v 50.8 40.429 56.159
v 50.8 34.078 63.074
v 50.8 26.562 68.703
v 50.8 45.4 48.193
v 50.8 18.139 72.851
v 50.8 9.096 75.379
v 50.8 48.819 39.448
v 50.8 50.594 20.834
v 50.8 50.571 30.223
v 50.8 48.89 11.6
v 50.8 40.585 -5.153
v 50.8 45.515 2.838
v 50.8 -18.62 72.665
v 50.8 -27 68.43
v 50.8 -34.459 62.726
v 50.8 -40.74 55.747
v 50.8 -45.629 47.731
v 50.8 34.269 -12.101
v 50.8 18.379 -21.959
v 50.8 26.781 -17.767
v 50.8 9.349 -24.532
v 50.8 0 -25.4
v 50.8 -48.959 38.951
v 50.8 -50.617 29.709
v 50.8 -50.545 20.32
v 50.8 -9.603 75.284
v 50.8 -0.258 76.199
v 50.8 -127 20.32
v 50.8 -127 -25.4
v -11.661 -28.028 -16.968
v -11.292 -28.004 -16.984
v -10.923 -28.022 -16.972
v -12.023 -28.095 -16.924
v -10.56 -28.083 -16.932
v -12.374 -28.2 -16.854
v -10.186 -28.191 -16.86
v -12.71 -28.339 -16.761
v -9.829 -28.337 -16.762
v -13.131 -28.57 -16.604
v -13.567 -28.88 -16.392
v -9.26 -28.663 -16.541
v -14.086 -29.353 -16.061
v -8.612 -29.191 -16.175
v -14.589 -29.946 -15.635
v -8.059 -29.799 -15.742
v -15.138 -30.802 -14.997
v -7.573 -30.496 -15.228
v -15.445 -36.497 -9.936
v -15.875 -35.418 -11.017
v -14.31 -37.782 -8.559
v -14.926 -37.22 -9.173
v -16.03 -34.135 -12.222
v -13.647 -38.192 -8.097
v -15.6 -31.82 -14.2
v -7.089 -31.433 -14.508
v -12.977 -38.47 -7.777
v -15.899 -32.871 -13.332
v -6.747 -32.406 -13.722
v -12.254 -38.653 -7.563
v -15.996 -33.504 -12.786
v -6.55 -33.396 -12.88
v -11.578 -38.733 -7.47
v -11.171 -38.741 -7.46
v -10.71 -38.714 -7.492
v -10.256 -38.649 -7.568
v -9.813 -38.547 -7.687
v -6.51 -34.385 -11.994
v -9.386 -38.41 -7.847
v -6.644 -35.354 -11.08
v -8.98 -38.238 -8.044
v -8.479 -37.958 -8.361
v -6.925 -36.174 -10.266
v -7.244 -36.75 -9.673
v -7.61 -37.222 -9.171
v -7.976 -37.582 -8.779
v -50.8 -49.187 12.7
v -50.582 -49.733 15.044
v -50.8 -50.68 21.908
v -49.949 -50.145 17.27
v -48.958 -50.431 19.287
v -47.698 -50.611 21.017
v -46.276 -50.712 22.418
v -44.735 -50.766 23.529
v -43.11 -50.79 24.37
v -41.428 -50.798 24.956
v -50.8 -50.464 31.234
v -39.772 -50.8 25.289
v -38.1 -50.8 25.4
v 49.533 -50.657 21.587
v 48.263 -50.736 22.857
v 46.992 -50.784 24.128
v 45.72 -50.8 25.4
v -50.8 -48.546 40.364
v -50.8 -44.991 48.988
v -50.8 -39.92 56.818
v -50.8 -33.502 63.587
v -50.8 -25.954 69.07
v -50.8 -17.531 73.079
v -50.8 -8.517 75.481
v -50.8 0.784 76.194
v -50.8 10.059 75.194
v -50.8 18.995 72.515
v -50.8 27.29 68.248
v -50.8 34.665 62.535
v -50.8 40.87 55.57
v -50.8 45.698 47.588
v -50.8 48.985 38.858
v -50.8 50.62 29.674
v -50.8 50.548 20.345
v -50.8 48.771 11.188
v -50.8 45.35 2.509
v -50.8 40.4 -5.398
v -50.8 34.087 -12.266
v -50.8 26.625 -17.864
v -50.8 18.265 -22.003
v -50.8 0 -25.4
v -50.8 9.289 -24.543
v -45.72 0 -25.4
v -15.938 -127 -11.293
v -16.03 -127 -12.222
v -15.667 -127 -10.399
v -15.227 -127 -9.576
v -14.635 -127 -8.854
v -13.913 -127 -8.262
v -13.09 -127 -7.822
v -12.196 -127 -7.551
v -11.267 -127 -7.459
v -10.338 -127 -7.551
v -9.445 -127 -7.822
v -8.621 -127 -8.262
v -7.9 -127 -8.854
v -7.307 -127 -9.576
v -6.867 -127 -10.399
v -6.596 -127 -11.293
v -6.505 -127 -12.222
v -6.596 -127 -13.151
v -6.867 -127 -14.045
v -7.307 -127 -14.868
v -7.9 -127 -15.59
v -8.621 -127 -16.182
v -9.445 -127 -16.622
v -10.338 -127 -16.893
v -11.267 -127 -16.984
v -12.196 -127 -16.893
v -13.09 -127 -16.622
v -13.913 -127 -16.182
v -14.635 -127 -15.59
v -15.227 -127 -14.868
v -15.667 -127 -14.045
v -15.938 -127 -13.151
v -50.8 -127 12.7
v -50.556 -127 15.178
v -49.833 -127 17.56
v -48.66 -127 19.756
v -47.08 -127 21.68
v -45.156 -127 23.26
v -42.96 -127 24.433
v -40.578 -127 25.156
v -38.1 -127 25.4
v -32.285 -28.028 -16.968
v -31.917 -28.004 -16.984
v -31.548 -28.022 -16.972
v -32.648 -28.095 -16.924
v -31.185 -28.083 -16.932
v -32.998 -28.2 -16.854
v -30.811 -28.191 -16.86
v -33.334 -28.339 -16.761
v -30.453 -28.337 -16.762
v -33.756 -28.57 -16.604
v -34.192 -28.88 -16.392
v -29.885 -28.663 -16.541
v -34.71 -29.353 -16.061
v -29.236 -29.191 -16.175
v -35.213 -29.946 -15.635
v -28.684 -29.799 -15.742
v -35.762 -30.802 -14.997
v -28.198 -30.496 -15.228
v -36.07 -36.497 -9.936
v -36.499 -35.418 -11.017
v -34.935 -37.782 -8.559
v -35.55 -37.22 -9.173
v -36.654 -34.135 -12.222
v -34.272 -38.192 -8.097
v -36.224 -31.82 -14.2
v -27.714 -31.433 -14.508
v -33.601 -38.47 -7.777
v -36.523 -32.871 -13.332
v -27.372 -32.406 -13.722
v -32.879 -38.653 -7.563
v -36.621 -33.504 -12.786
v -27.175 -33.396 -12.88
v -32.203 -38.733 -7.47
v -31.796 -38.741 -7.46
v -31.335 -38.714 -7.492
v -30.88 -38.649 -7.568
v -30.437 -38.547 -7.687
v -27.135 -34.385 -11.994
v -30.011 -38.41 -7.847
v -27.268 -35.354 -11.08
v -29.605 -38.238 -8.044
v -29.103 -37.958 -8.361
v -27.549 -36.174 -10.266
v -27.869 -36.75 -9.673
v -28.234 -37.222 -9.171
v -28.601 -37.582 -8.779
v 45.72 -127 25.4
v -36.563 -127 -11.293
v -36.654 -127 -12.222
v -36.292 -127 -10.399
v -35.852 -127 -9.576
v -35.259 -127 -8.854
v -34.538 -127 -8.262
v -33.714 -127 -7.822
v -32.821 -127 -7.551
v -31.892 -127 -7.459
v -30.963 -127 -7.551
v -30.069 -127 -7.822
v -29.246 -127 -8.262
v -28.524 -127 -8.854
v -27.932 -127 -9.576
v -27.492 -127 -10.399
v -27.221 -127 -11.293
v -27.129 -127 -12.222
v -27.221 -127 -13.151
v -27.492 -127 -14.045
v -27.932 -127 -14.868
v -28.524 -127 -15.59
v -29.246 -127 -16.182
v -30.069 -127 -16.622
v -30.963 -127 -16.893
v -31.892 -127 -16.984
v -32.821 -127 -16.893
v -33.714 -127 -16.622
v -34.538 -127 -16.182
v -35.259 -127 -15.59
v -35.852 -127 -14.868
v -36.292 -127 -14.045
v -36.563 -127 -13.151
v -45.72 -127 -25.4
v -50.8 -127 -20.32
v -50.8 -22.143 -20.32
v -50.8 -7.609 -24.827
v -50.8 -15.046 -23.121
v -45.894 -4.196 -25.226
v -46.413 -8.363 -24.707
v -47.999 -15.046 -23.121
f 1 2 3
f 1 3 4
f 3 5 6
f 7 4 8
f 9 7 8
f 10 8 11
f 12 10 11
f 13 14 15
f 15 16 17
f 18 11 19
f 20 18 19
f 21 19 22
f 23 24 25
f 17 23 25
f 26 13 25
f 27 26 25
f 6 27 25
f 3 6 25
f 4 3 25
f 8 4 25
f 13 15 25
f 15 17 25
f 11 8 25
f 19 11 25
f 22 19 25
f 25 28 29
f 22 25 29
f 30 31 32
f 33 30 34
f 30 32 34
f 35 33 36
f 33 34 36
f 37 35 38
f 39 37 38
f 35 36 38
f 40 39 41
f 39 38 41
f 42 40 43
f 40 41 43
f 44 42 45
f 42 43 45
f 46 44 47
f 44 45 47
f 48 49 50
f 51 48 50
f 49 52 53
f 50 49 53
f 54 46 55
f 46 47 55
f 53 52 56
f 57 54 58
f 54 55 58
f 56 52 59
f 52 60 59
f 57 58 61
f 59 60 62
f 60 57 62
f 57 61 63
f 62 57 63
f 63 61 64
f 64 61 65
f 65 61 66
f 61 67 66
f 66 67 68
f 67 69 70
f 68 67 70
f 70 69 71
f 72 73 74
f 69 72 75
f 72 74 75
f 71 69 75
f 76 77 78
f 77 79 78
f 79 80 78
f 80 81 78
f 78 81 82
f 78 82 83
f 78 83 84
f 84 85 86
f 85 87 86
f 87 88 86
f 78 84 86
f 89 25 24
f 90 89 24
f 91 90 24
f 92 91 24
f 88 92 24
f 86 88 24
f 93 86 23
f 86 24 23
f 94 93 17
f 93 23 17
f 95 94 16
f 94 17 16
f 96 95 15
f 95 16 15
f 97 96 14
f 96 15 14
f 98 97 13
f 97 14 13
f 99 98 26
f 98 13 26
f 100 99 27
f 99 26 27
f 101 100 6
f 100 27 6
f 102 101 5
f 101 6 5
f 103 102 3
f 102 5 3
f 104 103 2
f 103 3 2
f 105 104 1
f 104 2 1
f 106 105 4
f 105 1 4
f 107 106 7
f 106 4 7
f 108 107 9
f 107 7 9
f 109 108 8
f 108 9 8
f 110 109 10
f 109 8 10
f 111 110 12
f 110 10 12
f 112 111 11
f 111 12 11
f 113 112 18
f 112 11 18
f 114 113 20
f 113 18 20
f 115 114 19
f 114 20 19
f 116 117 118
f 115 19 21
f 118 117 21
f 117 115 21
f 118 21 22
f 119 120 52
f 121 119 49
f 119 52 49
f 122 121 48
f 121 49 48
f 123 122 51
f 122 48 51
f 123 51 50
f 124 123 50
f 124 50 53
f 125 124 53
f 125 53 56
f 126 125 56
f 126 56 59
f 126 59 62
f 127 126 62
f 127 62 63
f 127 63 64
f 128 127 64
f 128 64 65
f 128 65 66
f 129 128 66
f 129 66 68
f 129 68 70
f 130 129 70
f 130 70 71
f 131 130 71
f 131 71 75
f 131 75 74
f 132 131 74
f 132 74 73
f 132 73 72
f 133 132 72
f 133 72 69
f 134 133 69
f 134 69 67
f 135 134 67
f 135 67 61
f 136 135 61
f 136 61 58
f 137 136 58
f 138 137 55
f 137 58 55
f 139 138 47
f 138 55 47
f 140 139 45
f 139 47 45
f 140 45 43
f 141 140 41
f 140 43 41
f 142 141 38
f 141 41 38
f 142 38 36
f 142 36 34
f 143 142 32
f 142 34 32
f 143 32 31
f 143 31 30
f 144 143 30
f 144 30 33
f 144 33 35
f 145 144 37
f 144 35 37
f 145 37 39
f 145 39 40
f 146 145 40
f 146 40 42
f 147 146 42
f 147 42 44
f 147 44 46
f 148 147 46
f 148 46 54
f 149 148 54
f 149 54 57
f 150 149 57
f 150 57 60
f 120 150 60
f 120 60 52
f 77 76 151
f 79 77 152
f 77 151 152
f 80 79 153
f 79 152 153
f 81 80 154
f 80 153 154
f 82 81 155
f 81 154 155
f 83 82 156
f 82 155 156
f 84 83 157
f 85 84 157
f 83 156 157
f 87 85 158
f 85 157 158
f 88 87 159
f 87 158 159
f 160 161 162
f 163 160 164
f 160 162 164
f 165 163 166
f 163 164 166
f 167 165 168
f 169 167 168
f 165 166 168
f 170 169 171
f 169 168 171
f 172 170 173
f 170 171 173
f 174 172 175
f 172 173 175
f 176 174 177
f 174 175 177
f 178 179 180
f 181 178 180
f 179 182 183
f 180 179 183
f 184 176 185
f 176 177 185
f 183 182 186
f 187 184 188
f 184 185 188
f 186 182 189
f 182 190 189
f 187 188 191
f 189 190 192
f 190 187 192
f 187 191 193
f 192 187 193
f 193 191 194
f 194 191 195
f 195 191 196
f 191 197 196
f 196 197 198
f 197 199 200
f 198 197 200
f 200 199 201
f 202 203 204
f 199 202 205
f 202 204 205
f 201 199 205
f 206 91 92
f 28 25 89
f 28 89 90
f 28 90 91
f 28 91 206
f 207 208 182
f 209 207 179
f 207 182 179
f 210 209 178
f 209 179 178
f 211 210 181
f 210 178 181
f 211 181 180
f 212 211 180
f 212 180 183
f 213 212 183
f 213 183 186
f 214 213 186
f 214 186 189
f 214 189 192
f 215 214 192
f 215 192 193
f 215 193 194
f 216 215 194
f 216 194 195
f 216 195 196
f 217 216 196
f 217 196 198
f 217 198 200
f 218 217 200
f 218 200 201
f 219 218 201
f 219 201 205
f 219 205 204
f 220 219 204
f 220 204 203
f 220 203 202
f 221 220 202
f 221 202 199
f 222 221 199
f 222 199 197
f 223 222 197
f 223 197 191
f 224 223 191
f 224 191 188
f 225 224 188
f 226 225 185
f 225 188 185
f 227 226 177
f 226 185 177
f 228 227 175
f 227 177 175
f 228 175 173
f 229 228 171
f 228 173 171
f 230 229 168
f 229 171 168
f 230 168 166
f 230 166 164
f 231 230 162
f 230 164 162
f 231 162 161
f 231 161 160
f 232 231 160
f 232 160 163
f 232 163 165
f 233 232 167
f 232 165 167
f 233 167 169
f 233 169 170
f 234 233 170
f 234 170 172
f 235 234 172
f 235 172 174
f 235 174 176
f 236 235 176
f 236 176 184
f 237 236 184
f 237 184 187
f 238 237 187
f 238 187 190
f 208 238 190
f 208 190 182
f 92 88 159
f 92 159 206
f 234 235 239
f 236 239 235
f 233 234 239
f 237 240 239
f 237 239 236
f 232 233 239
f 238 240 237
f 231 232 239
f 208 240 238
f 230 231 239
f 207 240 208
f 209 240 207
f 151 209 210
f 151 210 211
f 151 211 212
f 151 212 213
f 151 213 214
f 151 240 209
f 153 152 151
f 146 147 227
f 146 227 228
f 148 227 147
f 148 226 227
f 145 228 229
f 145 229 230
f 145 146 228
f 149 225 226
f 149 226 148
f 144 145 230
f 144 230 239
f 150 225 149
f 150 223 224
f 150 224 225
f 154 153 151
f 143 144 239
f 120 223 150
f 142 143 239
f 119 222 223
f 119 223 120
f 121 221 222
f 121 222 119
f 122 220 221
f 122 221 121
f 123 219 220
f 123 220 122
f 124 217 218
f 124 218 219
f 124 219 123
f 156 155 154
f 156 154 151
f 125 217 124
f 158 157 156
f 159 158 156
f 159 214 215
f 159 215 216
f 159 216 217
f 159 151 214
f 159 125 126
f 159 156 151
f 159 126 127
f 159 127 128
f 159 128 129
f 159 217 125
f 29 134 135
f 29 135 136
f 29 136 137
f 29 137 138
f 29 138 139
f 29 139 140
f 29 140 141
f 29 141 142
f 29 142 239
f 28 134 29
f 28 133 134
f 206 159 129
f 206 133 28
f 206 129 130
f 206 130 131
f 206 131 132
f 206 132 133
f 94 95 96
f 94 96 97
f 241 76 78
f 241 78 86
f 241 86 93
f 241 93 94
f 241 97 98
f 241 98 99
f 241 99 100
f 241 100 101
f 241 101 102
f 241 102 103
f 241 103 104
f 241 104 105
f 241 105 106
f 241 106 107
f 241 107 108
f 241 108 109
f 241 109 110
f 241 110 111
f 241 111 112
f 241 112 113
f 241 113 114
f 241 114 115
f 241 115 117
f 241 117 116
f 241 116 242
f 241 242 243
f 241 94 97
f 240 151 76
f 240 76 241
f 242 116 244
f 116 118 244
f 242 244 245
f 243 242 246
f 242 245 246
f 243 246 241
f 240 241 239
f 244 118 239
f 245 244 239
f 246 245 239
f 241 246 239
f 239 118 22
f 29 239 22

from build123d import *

# Parameters (mm, degrees)
F0_W     = 101.6
F0_H     = 50.8
F1_DEPTH = 127
F2_R     = 4.7625
F3_DEPTH = 158.242
F4_R     = 12.7
F5_SIZE  = 5.08


with BuildPart() as f1:
    # F0 (on Front) → F1 (new body)
    with BuildSketch(Plane.XZ):
        Rectangle(F0_W, F0_H)
    extrude(amount=F1_DEPTH)

    # F2 (on face) → F3 (cut)
    with BuildSketch(Plane(origin=(0, 0, 0), x_dir=(-1, 0, 0), z_dir=(0, 1, 0))):
        with Locations((31.891733, -12.221986)):
            Circle(F2_R)
        with Locations((11.267137, -12.221986)):
            Circle(F2_R)
    extrude(amount=-F3_DEPTH, mode=Mode.SUBTRACT)

    # F4
    f4_edges = [f1.edges().sort_by_distance(p)[0] for p in [
        (-50.8, -63.5, 25.4),
    ]]
    fillet(f4_edges, radius=F4_R)

    # F5
    f5_edges = [f1.edges().sort_by_distance(p)[0] for p in [
        (50.8, -63.5, 25.4),
        (-50.8, -63.5, -25.4),
    ]]
    chamfer(f5_edges, length=F5_SIZE)

    # F0 (on Front) → F6 (revolve)
    with BuildSketch(Plane.XZ):
        Rectangle(F0_W, F0_H)
    revolve(axis=Axis((0, 0, 25.4), (-1, 0, 0)))


solid = f1.part
